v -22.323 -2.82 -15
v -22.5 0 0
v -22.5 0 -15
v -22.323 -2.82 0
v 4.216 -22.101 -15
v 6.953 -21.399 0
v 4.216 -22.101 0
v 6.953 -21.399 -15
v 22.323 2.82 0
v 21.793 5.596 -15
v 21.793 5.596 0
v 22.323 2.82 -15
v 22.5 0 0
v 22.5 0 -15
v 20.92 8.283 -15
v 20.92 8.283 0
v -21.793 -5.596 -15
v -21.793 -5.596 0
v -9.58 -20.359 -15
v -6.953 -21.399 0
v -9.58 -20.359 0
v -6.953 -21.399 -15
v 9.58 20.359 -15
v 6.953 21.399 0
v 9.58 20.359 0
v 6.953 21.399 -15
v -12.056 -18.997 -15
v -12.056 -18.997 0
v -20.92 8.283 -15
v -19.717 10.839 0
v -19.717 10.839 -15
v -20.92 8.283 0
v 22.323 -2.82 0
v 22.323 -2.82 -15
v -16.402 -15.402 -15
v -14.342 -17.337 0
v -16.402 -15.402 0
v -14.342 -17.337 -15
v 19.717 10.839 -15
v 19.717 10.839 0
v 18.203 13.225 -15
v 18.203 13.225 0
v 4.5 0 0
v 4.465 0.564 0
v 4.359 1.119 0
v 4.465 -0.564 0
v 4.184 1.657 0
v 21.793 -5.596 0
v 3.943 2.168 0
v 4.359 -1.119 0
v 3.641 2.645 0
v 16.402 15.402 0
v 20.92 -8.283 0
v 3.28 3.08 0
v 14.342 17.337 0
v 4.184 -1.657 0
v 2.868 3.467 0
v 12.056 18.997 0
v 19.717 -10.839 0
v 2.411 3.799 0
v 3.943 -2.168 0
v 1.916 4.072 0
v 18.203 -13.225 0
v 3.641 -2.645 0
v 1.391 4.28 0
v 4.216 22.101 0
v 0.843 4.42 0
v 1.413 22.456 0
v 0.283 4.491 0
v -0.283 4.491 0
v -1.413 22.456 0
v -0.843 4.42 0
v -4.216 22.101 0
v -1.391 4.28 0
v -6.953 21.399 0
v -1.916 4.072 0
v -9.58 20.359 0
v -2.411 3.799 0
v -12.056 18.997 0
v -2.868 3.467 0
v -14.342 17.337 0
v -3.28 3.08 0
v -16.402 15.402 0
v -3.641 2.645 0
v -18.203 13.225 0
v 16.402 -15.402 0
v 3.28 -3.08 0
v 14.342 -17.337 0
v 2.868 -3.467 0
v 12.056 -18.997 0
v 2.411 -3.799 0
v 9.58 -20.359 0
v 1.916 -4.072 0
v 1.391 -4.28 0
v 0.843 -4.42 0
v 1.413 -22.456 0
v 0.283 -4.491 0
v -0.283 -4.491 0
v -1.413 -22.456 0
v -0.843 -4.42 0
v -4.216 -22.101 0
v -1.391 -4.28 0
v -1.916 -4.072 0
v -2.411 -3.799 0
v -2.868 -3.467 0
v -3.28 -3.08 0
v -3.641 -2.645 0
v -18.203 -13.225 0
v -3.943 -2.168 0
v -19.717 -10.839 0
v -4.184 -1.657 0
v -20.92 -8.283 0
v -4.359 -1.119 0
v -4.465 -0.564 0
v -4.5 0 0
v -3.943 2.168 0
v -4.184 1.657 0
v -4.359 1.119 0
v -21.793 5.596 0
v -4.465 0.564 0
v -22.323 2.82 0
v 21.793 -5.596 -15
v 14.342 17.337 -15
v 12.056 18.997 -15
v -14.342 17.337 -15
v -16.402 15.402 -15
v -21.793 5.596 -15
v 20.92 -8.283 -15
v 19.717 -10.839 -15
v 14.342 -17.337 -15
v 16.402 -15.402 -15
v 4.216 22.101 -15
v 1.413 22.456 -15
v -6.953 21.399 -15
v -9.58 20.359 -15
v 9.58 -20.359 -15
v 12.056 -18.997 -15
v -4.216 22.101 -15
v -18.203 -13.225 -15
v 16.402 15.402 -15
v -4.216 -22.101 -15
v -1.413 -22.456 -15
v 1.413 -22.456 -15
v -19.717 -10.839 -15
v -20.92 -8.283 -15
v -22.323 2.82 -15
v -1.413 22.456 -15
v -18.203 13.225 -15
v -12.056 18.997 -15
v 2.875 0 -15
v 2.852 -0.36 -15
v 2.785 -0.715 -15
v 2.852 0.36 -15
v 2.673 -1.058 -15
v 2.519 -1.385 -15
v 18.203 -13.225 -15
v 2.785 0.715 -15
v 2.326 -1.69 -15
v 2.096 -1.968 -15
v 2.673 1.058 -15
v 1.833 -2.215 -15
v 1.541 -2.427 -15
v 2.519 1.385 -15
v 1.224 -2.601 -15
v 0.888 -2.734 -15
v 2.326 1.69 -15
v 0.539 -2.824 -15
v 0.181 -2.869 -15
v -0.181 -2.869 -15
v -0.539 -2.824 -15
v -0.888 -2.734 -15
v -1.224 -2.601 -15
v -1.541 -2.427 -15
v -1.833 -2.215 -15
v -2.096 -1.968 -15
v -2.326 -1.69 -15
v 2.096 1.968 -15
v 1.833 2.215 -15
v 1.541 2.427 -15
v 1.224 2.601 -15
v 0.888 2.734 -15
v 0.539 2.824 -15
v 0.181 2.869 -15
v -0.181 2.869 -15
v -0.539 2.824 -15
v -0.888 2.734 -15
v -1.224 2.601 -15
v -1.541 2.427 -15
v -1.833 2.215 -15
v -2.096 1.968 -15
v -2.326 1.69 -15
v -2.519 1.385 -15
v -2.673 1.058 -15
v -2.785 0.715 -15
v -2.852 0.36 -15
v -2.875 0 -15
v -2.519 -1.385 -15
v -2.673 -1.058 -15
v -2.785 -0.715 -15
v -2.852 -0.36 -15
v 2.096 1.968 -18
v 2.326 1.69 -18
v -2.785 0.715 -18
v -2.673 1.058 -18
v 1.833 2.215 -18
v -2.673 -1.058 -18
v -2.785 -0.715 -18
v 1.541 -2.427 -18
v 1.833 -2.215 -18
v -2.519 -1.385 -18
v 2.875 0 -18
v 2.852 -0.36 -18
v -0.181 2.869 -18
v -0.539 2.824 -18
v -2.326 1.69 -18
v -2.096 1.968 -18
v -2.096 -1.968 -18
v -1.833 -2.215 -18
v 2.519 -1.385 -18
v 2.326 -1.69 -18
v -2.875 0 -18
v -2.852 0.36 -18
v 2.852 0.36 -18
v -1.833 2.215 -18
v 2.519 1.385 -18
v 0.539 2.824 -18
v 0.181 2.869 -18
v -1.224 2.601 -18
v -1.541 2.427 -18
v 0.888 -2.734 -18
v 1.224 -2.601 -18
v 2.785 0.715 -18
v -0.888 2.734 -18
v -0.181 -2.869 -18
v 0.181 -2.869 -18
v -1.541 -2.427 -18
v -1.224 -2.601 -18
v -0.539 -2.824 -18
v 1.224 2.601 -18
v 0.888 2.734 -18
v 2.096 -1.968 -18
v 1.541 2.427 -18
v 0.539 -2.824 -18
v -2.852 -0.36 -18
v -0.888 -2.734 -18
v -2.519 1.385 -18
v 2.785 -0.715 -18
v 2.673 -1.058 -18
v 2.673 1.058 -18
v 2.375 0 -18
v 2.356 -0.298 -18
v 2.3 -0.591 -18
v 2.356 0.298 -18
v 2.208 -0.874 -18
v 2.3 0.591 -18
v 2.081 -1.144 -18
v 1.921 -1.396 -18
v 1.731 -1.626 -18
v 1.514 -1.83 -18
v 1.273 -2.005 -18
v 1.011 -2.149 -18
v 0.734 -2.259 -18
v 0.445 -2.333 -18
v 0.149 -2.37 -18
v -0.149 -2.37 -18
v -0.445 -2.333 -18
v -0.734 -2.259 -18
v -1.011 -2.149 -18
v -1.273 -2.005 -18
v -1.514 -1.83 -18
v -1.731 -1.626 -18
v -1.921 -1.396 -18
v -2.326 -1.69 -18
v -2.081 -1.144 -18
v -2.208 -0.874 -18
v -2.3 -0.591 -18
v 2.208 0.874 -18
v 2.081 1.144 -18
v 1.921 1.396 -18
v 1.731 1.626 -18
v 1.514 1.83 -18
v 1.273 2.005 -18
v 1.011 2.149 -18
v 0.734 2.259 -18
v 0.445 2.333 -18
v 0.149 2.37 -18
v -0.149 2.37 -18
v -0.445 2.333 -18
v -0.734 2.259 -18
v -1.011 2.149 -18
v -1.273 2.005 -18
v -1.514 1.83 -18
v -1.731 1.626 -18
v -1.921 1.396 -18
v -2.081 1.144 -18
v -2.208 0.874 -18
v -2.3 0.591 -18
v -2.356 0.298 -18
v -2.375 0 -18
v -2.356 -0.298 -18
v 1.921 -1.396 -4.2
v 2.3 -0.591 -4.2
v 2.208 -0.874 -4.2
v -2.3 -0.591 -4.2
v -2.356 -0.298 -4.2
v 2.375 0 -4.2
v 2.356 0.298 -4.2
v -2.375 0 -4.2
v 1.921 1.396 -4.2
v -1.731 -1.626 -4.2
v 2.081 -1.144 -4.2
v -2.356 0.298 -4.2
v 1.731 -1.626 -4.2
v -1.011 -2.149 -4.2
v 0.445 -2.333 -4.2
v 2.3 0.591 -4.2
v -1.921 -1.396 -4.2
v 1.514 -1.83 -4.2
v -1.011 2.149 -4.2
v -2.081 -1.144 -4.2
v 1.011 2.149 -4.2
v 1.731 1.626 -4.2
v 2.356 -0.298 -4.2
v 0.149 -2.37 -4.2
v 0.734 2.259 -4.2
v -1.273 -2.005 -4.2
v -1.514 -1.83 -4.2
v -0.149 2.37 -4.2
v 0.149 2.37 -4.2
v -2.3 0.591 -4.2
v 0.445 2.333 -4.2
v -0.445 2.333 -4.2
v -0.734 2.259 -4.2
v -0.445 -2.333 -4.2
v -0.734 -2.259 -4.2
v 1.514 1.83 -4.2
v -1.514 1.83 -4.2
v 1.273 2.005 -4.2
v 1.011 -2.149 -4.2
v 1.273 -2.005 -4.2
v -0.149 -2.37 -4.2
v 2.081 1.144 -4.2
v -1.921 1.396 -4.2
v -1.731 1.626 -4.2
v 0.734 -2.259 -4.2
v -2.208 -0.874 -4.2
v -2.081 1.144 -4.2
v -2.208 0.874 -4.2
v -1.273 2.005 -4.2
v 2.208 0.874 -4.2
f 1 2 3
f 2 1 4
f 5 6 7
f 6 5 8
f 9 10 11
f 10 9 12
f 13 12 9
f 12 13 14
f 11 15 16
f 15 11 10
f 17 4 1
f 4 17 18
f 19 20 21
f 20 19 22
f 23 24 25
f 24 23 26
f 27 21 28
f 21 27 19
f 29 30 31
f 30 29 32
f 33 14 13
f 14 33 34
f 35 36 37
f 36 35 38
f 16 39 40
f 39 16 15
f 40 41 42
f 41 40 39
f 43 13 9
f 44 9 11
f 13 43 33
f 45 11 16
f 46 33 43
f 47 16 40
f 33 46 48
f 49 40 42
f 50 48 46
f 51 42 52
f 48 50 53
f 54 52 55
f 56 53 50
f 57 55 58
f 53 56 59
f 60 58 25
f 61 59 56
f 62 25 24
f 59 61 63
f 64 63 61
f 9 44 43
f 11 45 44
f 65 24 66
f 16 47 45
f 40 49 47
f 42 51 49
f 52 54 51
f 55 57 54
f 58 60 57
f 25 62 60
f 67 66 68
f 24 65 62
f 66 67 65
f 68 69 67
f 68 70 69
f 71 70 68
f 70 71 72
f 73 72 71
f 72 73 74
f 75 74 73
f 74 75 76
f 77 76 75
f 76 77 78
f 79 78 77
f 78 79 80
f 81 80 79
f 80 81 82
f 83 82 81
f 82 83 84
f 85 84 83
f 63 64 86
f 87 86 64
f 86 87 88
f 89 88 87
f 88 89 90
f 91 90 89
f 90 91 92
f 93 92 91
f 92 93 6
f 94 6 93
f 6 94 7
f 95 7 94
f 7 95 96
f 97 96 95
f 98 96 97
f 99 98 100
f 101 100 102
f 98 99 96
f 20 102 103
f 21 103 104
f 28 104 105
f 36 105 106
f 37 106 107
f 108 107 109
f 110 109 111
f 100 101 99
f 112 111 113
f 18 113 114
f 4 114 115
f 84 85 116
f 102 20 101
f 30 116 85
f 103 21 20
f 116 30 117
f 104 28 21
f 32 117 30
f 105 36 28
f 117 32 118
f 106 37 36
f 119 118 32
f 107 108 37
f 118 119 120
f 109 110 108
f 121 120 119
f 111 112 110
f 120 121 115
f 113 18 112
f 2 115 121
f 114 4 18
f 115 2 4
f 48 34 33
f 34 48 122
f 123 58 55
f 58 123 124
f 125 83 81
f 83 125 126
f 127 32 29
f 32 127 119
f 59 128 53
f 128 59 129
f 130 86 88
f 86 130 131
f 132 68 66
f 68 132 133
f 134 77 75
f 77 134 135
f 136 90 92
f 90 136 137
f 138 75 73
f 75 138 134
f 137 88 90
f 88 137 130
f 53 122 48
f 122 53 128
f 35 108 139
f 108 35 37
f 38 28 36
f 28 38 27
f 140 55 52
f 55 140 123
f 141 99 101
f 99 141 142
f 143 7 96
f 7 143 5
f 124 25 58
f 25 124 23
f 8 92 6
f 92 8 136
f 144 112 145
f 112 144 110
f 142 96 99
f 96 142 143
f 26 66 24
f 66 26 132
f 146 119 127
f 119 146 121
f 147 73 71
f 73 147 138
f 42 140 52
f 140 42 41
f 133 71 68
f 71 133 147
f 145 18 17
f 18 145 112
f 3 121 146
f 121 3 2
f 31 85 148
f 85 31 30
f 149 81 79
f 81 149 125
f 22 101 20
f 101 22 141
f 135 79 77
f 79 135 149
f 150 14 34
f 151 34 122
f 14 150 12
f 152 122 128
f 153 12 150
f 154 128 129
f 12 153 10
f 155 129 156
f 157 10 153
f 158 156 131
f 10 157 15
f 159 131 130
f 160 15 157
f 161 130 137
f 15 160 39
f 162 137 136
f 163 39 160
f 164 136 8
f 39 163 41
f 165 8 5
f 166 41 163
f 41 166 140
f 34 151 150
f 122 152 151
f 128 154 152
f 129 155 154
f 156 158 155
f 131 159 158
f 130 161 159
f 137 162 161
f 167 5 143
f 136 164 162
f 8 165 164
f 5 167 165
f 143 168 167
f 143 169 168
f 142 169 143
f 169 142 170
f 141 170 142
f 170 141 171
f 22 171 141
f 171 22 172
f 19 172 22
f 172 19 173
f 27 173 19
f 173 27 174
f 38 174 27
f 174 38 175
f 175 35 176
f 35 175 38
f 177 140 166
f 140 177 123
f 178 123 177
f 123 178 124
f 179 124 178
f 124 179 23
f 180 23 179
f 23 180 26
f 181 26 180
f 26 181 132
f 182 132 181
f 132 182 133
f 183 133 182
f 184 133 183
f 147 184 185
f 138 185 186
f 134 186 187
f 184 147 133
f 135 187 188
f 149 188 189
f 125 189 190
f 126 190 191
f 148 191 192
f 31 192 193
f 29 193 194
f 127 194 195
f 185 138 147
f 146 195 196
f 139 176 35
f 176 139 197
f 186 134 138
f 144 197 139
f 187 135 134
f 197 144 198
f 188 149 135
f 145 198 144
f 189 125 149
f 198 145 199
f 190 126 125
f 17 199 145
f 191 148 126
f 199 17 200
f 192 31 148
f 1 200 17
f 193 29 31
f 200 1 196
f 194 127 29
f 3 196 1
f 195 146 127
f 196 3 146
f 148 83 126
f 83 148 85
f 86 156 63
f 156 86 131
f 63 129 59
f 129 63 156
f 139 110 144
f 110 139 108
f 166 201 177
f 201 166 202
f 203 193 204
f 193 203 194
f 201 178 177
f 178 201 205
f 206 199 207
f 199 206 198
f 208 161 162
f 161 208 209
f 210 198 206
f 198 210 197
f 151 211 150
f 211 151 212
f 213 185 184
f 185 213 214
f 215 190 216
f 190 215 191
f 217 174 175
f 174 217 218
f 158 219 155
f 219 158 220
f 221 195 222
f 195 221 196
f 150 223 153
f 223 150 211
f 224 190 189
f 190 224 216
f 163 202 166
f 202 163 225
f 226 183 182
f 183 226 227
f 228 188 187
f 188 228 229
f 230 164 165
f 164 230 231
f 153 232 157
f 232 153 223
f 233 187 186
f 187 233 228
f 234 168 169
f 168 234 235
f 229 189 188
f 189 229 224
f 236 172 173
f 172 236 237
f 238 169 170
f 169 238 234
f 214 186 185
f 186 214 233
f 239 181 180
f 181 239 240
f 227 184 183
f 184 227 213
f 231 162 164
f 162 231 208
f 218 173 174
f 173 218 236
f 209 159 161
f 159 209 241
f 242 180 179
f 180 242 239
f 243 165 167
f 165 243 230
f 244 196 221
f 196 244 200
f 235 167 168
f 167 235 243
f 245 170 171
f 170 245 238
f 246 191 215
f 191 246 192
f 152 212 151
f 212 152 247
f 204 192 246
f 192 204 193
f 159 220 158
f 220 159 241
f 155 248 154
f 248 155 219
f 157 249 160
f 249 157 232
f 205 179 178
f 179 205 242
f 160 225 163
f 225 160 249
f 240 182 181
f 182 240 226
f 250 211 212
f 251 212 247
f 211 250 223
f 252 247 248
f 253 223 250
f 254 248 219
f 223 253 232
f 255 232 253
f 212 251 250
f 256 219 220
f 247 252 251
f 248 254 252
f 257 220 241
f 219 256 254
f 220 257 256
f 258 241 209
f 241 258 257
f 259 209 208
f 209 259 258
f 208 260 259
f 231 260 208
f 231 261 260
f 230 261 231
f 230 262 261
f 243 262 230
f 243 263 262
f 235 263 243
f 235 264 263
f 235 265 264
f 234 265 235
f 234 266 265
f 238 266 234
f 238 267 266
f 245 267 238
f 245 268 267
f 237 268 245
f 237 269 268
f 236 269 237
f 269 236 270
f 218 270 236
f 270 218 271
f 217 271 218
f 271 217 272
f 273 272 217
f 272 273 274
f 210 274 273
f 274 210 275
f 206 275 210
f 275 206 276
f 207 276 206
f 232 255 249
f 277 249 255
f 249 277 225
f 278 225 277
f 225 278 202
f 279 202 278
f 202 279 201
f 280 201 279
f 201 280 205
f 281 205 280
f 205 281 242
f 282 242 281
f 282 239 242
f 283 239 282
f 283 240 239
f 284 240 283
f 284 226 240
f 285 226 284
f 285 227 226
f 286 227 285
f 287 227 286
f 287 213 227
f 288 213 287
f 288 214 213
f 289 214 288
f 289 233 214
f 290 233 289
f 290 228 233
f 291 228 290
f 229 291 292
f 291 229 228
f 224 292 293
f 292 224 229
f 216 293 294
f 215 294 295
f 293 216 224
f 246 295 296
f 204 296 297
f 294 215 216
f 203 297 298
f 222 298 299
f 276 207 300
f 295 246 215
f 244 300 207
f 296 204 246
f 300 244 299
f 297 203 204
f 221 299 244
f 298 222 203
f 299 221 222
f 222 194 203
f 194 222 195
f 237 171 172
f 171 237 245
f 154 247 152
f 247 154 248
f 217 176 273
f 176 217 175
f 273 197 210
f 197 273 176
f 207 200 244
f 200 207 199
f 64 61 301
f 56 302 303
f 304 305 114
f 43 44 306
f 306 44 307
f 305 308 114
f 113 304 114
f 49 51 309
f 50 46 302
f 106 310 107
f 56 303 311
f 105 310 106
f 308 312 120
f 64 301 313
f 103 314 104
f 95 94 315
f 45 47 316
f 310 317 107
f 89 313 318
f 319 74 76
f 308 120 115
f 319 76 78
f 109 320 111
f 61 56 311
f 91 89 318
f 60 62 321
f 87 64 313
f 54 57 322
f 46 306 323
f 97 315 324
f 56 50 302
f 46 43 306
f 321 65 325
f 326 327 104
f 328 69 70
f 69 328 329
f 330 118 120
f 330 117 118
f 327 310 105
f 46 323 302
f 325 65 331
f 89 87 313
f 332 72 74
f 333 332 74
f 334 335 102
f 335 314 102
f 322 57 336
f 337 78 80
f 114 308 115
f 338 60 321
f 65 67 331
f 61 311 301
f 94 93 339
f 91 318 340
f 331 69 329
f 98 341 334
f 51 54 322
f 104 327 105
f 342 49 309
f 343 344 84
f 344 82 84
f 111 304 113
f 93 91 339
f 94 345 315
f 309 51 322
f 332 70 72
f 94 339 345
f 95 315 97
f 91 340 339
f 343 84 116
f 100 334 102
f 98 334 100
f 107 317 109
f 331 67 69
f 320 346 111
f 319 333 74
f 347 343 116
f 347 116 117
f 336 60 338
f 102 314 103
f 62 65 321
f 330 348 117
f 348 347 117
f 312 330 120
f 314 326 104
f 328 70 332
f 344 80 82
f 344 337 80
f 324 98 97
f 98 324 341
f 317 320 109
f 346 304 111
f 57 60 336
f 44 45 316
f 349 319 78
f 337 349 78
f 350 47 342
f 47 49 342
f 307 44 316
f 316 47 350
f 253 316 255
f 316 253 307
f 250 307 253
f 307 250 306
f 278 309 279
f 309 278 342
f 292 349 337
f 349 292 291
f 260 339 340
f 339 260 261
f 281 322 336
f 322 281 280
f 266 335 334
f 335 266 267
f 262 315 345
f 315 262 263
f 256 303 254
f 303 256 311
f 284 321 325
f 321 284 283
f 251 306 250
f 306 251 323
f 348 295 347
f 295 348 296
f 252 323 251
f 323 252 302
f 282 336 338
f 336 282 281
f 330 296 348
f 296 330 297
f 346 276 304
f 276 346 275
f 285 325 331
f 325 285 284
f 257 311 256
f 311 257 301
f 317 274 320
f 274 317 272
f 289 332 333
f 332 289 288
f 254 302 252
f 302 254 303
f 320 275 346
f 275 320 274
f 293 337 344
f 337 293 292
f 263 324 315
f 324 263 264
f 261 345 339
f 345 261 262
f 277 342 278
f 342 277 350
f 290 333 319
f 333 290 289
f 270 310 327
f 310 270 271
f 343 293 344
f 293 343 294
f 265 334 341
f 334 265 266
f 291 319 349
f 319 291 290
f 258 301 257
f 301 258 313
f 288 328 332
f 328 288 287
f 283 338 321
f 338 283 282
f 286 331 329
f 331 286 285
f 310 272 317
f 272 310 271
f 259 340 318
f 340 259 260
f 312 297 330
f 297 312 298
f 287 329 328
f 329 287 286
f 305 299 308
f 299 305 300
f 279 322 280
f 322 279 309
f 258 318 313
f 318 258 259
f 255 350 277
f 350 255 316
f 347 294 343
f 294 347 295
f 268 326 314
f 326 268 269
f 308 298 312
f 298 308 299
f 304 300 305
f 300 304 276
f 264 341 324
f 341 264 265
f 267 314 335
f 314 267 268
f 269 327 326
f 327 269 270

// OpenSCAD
$fn = 50;


difference() {
	union() {
		translate(v = [0, 0, -15.0000000000]) {
			cylinder(h = 15, r = 22.5000000000);
		}
		#translate(v = [0, 0, -18.0000000000]) {
			cylinder(h = 18, r = 2.8750000000);
		}
	}
	union() {
		translate(v = [0, 0, 0]) {
			rotate(a = [0, 0, 0]) {
				difference() {
					union() {
						translate(v = [0, 0, -18.0000000000]) {
							cylinder(h = 18, r = 2.2500000000);
						}
						translate(v = [0, 0, -4.2000000000]) {
							cylinder(h = 4.2000000000, r1 = 2.3750000000, r2 = 4.5000000000);
						}
						translate(v = [0, 0, -18.0000000000]) {
							cylinder(h = 18, r = 2.3750000000);
						}
						translate(v = [0, 0, -18.0000000000]) {
							cylinder(h = 18, r = 2.2500000000);
						}
					}
					union();
				}
			}
		}
	}
}
